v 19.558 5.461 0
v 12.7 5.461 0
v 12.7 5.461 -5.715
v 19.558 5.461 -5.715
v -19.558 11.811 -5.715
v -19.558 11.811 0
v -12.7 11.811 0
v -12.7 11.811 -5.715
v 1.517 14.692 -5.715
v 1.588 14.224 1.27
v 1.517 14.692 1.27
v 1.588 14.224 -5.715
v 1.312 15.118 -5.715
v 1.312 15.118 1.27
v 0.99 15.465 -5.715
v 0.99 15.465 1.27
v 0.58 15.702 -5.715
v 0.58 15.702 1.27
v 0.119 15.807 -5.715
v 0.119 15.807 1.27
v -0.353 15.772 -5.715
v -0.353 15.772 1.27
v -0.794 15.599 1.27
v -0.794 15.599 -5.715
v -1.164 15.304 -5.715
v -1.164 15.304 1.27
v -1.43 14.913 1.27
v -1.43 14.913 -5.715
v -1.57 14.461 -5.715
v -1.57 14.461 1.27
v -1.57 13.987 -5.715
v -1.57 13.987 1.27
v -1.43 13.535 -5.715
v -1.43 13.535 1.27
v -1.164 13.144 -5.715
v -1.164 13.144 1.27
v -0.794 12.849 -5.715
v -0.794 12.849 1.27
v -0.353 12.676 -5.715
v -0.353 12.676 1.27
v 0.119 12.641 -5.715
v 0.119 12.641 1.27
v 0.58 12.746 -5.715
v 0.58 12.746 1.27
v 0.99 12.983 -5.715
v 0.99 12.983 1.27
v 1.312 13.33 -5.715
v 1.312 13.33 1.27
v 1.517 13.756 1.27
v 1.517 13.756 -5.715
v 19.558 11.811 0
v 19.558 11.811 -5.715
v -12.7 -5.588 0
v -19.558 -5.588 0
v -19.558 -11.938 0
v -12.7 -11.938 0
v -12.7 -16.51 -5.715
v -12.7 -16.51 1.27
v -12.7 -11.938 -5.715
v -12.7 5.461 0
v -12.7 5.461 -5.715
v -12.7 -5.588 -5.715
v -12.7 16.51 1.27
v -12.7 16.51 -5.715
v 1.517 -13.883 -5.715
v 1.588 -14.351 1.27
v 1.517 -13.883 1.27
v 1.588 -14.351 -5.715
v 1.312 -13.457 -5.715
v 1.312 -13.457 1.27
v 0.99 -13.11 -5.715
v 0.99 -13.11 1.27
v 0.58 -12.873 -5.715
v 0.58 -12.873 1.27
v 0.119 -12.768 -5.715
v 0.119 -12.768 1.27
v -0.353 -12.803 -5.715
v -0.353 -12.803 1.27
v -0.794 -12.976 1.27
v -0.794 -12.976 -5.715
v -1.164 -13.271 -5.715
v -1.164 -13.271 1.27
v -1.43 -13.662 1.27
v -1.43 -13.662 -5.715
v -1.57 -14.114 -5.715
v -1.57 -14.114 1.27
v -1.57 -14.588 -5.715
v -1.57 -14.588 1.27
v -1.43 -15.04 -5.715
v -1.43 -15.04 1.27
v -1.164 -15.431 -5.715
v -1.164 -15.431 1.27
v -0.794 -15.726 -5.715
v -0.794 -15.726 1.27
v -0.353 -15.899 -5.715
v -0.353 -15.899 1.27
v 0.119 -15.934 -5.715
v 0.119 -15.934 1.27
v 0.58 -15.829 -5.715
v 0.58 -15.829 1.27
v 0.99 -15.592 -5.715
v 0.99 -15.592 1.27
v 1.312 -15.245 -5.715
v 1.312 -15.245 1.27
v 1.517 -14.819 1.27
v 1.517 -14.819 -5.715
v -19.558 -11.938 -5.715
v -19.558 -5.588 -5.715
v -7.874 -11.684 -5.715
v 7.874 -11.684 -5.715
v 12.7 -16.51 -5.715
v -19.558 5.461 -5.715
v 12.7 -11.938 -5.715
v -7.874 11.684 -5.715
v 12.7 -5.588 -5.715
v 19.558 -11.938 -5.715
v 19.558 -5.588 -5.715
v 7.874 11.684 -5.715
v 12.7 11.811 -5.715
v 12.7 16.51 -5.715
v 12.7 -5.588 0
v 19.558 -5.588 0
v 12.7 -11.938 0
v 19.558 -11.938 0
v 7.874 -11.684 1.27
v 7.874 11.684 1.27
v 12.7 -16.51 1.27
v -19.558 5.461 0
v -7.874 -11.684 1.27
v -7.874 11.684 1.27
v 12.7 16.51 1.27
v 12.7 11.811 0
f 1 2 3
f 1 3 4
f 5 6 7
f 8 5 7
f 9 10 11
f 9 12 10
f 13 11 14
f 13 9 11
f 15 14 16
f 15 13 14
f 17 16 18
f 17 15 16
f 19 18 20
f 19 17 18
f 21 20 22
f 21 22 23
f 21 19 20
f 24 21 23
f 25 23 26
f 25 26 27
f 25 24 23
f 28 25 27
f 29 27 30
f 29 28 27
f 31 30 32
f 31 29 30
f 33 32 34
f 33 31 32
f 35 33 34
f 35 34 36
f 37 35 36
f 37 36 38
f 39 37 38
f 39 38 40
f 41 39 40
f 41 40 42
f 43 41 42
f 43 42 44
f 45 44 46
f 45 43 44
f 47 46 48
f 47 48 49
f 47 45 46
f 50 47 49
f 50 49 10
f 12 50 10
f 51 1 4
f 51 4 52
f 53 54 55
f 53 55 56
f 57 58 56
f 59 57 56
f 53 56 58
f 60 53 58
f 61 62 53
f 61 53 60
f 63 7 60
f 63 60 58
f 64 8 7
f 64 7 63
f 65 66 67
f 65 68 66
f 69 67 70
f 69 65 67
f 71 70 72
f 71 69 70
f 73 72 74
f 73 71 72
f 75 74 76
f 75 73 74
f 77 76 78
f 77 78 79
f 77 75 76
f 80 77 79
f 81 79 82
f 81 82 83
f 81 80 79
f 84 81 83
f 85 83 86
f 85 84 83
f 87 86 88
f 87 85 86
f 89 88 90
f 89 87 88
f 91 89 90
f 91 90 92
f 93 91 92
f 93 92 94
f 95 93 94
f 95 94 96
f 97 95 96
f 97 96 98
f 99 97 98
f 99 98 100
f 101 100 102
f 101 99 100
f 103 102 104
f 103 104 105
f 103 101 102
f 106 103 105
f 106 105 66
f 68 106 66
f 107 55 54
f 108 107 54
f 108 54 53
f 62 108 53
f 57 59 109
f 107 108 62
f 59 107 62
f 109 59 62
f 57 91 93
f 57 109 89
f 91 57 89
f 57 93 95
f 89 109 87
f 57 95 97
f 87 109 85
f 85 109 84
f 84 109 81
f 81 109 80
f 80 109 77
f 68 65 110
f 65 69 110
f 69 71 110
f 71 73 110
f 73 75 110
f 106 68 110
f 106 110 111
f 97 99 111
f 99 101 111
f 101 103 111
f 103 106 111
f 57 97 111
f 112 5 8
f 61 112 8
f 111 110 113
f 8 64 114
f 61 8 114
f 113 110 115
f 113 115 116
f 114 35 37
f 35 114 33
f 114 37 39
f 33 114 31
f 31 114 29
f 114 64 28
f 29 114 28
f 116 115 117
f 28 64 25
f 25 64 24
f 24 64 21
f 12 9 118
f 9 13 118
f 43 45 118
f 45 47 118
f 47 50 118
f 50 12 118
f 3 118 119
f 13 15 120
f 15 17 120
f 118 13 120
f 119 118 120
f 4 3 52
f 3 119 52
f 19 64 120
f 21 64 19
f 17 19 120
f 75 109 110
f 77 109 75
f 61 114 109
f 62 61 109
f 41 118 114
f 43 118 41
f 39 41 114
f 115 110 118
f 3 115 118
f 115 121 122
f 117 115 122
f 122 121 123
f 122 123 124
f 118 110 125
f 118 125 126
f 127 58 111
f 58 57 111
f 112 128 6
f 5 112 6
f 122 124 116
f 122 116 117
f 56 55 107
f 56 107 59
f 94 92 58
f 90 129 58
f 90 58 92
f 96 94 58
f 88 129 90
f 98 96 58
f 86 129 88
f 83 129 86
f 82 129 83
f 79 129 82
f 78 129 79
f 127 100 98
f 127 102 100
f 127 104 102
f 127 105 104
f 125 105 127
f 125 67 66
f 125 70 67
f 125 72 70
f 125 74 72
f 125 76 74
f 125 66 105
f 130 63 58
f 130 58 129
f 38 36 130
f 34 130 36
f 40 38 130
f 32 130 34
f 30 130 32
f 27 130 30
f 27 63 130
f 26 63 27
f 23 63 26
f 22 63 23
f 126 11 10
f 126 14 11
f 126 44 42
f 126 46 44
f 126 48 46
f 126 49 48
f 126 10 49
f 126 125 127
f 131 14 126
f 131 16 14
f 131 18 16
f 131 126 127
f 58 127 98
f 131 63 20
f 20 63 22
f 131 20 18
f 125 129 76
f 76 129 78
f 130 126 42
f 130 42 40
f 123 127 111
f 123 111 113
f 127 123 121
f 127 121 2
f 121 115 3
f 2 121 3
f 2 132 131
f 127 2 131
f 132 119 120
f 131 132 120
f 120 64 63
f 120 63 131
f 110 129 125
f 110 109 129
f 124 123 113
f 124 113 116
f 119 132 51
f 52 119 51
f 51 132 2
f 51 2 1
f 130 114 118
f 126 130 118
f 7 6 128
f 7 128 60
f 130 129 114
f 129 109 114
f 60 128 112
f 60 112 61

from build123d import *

# Parameters (mm, degrees)
F0_R     = 1.5875
F0_W     = 15.748
F0_H     = 23.368
F0_W_2   = 6.858
F0_H_2   = 6.35
F1_DEPTH = 5.715
F2_W     = 25.4
F2_H     = 33.02
F2_R     = 1.5875
F2_W_2   = 15.748
F2_H_2   = 23.368
F3_DEPTH = 1.27


with BuildPart() as f1:
    # F0 (on Top) → F1 (new body)
    with BuildSketch(Plane.XY):
        Polygon((12.7, 16.51), (-12.7, 16.51), (-12.7, 11.811), (-12.7, 5.461), (-12.7, -5.588), (-12.7, -11.938), (-12.7, -16.51), (12.7, -16.51), (12.7, -11.938), (12.7, -5.588), (12.7, 5.461), (12.7, 11.811), align=None)
        with Locations((0, -14.351)):
            Circle(F0_R, mode=Mode.SUBTRACT)
        Rectangle(F0_W, F0_H, mode=Mode.SUBTRACT)
        with Locations((0, 14.224)):
            Circle(F0_R, mode=Mode.SUBTRACT)
        with Locations((-16.129, 8.636)):
            Rectangle(F0_W_2, F0_H_2)
        with Locations((16.129, 8.636)):
            Rectangle(F0_W_2, F0_H_2)
        with Locations((-16.129, -8.763)):
            Rectangle(F0_W_2, F0_H_2)
        with Locations((16.129, -8.763)):
            Rectangle(F0_W_2, F0_H_2)
    extrude(amount=-F1_DEPTH)

    # F2 (on face) → F3 (join)
    with BuildSketch(Plane.XY):
        Rectangle(F2_W, F2_H)
        with Locations((0, -14.351)):
            Circle(F2_R, mode=Mode.SUBTRACT)
        with Locations((0, 14.224)):
            Circle(F2_R, mode=Mode.SUBTRACT)
        Rectangle(F2_W_2, F2_H_2, mode=Mode.SUBTRACT)
    extrude(amount=F3_DEPTH)


solid = f1.part
